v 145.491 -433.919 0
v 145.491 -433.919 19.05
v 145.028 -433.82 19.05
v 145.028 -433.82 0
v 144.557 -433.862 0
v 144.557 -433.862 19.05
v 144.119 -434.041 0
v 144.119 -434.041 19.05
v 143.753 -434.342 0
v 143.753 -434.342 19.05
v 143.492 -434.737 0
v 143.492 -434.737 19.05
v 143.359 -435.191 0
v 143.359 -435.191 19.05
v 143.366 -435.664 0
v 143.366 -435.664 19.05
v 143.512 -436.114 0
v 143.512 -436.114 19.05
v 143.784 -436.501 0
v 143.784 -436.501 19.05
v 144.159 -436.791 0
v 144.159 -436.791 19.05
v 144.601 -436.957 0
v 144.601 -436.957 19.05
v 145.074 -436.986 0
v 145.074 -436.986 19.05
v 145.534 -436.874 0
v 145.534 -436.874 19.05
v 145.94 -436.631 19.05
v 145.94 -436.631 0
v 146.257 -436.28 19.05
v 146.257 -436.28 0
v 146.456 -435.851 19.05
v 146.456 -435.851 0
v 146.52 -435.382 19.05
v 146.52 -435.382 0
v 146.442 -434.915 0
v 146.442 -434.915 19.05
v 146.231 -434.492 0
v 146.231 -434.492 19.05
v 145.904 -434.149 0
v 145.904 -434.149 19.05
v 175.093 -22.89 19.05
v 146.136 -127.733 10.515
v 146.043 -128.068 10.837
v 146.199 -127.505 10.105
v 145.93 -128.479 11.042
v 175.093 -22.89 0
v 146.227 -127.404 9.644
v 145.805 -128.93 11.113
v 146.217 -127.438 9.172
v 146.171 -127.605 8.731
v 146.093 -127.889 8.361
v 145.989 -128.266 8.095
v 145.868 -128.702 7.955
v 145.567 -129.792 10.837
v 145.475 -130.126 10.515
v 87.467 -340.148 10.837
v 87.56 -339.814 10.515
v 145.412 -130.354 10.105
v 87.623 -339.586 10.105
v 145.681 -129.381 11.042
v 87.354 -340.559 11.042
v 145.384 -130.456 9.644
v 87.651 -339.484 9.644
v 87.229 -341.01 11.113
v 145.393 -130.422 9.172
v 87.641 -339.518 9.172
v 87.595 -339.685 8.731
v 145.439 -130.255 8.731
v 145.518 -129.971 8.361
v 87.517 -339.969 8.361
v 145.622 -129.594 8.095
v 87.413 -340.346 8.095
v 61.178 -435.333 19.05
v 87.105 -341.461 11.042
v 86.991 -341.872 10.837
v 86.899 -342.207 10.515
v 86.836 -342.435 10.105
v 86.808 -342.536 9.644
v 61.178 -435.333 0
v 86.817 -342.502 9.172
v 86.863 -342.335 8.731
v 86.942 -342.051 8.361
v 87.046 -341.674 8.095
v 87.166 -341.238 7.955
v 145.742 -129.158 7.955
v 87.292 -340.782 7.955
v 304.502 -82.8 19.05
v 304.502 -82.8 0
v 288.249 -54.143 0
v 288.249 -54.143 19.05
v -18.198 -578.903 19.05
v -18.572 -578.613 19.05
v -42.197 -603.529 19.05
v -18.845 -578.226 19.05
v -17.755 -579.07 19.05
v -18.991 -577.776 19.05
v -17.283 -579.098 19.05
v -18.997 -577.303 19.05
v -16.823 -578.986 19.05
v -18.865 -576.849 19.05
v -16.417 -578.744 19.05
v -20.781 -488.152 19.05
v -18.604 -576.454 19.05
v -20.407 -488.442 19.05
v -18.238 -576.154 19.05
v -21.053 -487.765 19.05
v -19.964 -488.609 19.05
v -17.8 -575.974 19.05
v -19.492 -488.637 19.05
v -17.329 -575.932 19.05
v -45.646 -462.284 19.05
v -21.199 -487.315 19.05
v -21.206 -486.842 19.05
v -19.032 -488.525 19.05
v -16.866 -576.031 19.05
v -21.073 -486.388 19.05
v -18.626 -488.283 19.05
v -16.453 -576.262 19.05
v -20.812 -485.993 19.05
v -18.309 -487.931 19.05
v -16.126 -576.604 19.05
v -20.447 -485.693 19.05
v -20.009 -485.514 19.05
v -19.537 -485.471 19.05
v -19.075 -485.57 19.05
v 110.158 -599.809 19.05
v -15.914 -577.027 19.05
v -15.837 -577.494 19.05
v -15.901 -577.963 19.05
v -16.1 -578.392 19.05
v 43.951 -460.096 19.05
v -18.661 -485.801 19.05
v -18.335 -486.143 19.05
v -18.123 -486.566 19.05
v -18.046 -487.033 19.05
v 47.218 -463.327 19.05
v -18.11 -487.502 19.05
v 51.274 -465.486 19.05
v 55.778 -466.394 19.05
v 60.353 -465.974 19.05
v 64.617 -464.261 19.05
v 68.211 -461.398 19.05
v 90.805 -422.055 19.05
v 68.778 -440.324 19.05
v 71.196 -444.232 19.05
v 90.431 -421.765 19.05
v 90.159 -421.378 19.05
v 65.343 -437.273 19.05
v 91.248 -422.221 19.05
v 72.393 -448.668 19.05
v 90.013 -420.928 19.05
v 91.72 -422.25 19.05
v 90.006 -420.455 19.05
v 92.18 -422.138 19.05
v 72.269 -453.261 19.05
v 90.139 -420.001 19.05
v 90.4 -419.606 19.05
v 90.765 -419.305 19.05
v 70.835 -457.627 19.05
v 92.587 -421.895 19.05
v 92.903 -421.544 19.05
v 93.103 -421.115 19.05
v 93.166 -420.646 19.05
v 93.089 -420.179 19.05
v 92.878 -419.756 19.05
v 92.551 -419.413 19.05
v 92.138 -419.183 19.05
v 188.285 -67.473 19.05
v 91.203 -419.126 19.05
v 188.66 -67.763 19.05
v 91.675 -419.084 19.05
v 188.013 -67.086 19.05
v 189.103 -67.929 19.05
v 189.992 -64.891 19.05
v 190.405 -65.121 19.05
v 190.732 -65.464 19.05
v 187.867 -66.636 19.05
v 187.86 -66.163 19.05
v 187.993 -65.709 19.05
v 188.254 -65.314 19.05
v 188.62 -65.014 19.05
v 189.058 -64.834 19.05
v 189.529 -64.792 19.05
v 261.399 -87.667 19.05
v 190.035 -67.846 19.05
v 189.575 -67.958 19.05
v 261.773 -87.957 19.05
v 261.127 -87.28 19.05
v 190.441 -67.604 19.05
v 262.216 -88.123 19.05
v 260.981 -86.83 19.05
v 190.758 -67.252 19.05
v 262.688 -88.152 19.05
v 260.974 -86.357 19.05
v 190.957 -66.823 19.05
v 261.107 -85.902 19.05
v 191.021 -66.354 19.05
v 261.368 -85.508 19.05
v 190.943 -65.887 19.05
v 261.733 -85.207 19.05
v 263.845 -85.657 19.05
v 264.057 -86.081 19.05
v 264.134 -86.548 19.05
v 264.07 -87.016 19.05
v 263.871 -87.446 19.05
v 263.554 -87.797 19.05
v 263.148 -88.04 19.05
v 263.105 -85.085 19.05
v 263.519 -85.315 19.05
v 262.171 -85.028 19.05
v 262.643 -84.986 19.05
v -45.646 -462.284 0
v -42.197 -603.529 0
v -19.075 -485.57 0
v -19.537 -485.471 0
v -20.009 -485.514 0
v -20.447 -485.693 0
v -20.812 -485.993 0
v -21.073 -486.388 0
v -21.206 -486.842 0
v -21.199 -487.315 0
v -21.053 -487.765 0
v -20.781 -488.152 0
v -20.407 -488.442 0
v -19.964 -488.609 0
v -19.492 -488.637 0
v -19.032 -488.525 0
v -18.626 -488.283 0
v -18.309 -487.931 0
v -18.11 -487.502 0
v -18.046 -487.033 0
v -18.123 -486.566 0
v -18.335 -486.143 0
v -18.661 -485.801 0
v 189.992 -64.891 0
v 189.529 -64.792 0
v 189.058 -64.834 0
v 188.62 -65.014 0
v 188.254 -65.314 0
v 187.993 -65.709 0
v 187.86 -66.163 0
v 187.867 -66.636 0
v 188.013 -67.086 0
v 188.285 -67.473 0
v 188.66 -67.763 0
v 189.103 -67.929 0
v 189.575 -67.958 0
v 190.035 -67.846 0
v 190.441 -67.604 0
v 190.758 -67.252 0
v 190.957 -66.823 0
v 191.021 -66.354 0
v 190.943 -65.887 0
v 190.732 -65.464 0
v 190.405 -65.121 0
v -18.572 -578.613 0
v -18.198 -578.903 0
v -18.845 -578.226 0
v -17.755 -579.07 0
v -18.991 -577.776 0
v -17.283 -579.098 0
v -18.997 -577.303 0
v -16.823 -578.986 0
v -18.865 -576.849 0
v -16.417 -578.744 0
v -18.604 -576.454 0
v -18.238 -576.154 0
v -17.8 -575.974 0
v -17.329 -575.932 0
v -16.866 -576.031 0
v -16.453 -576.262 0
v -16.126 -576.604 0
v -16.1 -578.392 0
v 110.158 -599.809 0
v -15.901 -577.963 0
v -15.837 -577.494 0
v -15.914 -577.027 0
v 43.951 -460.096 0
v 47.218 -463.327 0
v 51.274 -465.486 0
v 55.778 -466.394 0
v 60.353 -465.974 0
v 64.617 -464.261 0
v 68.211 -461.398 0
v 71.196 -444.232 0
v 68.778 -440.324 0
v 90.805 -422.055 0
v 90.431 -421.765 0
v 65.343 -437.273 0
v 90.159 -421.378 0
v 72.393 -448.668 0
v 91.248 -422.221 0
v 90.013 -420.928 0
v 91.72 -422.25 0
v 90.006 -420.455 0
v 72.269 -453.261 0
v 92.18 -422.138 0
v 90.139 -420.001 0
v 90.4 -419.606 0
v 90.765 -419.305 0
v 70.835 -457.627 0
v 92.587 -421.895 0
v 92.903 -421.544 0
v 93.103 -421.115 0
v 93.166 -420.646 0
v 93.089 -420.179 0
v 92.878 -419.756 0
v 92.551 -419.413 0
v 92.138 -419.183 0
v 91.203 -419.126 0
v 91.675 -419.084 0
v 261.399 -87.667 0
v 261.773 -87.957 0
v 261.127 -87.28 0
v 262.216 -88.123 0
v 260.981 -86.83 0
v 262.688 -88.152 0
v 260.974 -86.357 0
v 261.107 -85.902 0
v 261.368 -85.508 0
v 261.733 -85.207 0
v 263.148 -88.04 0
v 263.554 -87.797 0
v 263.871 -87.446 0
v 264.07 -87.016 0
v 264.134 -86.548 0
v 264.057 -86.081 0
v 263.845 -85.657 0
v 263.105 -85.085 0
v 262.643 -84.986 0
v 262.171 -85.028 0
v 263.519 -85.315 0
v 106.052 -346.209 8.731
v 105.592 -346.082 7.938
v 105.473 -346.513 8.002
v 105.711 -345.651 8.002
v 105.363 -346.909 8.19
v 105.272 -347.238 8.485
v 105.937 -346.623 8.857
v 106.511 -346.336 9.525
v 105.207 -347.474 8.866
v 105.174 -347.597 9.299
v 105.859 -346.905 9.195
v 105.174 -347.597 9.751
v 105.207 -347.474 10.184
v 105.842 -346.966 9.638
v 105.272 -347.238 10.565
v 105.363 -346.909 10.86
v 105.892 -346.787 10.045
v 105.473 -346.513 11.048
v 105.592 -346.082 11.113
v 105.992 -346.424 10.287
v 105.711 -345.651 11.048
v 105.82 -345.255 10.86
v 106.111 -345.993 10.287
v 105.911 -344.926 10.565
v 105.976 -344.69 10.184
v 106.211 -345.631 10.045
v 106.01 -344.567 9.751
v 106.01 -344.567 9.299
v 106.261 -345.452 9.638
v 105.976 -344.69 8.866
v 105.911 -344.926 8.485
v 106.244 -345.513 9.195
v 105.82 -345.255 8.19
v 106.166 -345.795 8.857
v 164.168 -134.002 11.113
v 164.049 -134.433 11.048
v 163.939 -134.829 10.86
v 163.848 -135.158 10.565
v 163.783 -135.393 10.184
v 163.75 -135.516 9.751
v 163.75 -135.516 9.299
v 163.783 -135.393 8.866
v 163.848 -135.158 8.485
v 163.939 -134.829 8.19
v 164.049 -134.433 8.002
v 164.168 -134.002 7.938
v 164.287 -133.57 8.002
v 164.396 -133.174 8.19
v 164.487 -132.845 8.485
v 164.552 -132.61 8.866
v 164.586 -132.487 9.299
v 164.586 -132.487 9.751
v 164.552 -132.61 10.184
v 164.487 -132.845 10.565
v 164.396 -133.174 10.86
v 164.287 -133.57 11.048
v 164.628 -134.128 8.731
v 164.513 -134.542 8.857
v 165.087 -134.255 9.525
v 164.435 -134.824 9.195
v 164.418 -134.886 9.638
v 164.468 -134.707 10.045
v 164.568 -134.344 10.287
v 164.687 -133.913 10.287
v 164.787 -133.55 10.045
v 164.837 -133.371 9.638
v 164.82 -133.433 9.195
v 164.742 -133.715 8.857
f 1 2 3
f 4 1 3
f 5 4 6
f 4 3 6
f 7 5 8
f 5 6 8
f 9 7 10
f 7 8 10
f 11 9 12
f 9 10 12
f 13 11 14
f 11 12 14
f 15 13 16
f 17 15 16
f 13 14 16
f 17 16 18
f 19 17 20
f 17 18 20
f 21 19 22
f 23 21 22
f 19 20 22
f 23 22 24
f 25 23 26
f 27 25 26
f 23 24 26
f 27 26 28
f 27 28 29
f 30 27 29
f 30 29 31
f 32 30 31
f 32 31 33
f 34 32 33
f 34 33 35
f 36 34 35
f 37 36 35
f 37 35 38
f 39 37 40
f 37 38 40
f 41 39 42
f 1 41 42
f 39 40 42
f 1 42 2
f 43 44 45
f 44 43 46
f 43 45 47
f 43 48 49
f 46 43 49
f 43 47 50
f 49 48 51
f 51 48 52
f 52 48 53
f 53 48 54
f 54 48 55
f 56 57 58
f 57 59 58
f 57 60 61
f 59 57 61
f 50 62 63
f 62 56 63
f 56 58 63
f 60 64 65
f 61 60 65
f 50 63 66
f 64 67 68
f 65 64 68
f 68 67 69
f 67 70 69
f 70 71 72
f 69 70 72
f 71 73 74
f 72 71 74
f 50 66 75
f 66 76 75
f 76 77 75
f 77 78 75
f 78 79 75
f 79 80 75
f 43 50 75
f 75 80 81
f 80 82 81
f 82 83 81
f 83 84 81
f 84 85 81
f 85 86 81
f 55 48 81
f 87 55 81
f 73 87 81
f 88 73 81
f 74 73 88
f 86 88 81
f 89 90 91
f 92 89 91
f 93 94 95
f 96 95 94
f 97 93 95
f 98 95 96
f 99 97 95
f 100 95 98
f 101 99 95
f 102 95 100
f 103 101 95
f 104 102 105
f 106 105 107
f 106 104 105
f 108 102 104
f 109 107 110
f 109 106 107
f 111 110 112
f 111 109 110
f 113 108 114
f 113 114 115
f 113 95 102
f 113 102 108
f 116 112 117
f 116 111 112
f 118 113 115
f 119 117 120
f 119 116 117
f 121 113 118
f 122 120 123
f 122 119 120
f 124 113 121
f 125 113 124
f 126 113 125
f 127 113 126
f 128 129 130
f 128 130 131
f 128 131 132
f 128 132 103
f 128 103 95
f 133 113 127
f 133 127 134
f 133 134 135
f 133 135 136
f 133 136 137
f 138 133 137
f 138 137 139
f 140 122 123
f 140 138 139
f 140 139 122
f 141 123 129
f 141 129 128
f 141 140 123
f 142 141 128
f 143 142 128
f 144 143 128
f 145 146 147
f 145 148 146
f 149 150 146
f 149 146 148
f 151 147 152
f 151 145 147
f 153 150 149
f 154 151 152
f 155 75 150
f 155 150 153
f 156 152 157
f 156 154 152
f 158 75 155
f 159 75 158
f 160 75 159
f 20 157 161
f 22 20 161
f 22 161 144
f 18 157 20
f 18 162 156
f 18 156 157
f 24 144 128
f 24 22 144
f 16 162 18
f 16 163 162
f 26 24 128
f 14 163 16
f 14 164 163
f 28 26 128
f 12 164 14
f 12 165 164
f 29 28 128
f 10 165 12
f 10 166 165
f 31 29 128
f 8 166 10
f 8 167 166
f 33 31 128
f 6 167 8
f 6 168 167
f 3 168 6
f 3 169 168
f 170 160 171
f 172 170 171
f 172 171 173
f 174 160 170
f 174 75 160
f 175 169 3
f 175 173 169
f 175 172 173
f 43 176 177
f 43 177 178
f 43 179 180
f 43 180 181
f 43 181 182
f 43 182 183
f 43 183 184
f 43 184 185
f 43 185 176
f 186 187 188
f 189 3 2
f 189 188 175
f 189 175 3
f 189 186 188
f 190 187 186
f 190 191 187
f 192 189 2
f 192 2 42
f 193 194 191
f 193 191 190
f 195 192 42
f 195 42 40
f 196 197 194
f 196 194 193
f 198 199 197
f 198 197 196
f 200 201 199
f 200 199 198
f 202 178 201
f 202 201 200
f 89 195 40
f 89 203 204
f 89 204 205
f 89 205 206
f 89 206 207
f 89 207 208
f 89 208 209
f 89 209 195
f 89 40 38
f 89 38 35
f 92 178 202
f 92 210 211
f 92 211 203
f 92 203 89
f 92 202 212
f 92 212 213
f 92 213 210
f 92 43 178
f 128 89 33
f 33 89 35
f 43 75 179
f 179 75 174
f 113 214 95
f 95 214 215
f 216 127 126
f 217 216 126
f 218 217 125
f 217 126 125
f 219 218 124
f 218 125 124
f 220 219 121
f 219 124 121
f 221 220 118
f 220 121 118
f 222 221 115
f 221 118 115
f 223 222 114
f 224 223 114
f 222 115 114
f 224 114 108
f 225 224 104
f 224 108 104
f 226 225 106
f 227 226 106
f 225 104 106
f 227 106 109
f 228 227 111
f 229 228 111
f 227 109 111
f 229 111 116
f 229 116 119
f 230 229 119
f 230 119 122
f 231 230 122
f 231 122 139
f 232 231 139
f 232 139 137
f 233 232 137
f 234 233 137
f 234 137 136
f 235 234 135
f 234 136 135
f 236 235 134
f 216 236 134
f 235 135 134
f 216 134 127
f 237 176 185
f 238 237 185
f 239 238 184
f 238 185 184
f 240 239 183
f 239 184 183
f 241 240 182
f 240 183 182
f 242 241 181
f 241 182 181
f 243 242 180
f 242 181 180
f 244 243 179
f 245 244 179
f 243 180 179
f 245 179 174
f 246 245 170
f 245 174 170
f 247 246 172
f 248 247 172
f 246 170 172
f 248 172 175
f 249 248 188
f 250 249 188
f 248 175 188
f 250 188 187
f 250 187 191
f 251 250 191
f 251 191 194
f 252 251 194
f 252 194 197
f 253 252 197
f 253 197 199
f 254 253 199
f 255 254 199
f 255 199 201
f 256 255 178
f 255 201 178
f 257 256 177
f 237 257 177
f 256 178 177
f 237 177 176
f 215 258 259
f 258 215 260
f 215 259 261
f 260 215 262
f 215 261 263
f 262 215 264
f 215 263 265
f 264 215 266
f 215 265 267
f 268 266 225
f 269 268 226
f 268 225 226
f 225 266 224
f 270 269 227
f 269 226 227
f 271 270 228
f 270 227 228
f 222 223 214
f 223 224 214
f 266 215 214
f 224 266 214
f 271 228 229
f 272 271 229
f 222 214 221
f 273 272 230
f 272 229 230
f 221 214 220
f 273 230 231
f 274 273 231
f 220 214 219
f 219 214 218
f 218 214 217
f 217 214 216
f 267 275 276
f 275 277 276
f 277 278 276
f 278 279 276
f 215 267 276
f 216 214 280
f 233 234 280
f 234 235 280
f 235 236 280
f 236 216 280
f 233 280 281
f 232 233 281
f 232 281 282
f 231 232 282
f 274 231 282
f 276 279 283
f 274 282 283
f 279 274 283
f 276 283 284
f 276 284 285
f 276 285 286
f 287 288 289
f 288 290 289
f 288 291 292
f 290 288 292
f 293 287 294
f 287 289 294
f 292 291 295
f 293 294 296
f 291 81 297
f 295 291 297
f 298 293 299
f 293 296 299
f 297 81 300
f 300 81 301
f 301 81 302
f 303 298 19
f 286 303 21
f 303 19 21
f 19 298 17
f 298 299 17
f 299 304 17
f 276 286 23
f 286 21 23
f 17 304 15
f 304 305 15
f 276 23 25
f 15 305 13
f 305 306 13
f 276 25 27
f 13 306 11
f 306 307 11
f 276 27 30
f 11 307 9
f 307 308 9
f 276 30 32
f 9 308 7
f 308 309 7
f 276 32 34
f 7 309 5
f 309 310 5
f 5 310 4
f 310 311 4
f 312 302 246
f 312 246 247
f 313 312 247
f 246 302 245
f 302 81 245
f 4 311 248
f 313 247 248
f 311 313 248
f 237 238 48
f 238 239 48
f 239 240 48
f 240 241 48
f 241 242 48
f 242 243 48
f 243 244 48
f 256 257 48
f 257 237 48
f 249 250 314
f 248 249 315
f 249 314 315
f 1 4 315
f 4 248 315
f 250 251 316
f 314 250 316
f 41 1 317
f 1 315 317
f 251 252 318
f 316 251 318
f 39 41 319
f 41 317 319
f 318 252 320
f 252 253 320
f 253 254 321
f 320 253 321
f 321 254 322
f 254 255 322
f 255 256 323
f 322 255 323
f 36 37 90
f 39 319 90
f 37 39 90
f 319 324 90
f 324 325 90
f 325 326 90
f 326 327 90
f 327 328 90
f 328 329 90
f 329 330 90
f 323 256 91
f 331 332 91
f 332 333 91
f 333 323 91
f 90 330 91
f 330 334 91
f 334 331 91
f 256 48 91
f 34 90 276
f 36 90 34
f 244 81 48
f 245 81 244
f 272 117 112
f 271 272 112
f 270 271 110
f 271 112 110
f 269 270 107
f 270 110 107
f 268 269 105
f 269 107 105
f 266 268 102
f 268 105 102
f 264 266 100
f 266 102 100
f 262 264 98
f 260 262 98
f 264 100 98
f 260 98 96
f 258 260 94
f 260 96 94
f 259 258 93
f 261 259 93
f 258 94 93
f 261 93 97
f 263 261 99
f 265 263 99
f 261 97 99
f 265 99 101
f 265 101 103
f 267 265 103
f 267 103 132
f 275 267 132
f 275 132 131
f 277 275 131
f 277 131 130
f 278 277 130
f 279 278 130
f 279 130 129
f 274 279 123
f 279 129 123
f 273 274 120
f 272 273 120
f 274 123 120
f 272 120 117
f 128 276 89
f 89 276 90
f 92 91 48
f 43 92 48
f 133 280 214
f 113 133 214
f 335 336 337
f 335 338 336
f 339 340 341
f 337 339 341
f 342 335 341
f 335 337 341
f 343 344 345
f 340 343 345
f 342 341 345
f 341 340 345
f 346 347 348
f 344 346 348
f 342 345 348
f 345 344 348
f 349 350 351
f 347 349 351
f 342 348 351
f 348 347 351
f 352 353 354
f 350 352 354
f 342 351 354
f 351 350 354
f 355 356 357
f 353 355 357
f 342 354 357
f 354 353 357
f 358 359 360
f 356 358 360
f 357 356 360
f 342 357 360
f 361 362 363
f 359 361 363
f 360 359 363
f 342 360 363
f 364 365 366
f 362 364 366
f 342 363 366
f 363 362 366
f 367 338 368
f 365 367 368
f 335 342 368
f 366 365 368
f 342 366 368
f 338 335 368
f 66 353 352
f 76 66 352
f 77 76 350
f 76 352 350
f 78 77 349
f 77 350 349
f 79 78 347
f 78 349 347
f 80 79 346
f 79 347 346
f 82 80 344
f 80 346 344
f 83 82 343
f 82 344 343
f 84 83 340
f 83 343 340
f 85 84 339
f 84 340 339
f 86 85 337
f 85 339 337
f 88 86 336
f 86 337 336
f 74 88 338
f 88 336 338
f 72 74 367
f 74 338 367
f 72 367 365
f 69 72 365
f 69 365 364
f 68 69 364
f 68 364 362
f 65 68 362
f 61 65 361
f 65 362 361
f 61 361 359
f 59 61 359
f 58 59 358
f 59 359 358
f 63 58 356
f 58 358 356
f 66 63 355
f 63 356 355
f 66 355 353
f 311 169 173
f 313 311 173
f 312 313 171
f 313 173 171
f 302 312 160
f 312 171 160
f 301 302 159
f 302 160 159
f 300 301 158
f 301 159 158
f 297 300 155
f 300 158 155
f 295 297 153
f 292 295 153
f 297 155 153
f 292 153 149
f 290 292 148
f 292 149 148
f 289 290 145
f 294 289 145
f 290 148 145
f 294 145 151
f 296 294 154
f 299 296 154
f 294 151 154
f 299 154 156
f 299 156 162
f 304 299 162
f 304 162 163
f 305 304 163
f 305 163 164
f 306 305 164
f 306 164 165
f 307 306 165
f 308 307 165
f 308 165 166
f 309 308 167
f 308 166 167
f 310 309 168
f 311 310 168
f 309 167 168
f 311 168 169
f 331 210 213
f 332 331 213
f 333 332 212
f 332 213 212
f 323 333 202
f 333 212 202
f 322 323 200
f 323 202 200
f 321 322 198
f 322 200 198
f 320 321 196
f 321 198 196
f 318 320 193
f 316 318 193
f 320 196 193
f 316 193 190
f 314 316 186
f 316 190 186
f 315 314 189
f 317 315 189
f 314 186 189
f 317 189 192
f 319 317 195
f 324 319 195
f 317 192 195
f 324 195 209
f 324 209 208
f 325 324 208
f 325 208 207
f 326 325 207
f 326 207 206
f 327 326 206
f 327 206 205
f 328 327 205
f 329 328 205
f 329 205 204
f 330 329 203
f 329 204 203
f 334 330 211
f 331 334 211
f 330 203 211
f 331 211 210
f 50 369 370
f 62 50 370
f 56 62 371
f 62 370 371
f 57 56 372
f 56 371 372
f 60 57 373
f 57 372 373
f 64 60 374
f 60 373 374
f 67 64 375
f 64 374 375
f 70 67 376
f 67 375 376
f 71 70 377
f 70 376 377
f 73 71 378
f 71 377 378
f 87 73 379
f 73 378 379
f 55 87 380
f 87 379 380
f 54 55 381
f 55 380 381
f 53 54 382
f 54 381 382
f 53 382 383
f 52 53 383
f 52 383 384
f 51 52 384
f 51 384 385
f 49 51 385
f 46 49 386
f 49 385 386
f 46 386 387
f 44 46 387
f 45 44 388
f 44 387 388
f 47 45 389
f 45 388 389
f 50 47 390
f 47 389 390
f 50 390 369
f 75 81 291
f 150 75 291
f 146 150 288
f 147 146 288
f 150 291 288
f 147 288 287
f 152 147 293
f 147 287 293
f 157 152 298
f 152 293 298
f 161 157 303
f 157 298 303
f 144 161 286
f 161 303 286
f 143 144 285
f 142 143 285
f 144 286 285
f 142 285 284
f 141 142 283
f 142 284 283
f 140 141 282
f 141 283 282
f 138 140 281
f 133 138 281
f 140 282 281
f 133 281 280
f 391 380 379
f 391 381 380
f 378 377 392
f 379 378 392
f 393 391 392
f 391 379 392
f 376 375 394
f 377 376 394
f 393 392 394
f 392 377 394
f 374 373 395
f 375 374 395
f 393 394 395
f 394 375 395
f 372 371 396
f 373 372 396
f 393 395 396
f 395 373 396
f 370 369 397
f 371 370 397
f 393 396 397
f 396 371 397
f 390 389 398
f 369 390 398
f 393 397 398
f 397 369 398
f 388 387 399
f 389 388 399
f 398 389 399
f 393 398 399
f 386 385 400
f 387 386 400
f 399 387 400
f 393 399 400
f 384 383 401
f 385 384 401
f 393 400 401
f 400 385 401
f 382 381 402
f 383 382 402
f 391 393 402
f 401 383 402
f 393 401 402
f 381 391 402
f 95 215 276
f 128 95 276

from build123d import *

# Parameters (mm, degrees)
BOSS_EXTRUDE1_DEPTH = 19.05
HOLE2_D             = 3.175
HOLE2_DEPTH         = 31.75
HOLE2_CSINK_D       = 10.16
HOLE2_CSINK_ANGLE   = 82
HOLE2_TIP           = 0.953866233
HOLE3_D             = 3.175
HOLE3_DEPTH         = 38.1
HOLE3_CSINK_D       = 10.16
HOLE3_CSINK_ANGLE   = 82
HOLE3_TIP           = 0.953866233


with BuildPart() as part:
    # Sketch1 → Boss-Extrude1 (new body)
    with BuildSketch(Plane.XY):
        with BuildLine():
            Line((-45.645654956, -462.283590669), (-42.196851456, -603.529354269))
            Line((-42.196851456, -603.529354269), (110.157739028, -599.809306096))
            Line((110.157739028, -599.809306096), (304.502022379, -82.799914861))
            Line((304.502022379, -82.799914861), (288.249001778, -54.142860136))
            Line((288.249001778, -54.142860136), (175.093421906, -22.889613201))
            Line((175.093421906, -22.889613201), (61.177817241, -435.332721236))
            ThreePointArc((61.177817241, -435.332721236), (69.660650717, -459.60790015), (43.950640658, -460.09591431))
            Line((43.950640658, -460.09591431), (-45.645654956, -462.283590669))
        make_face()
    extrude(amount=BOSS_EXTRUDE1_DEPTH)

    # Hole2
    with Locations(Plane(origin=(162.245907498, -21.702082459, 165.474999994), x_dir=(0, 0, -1), z_dir=(-0.963909776, 0.266229118, 0))):
        with Locations((-155.949999994, 107.734820482), (155.949999994, 107.734820482), (155.949999994, 327.755881328), (174.999999994, 85.732714397), (174.999999994, 349.757987412), (-174.999999994, 349.757987412), (-174.999999994, 85.732714397), (-155.949999994, 327.755881328)):
            CounterSinkHole(HOLE2_D / 2, HOLE2_CSINK_D / 2, depth=HOLE2_DEPTH, counter_sink_angle=HOLE2_CSINK_ANGLE)
            with Locations((0, 0, -(HOLE2_DEPTH + HOLE2_TIP / 2))):  # 118° drill point
                Cone(0, HOLE2_D / 2, HOLE2_TIP, mode=Mode.SUBTRACT)

    # Hole3
    with Locations(Plane(origin=(311.92831292, -63.043933951, -19.05), x_dir=(-0.351862635, -0.936051647, 0), z_dir=(0, 0, -1))):
        with Locations((46.221112845, 113.488854888), (39.39759596, 37.945520226), (412.28786892, 80.423559293), (407.308516105, 25.297013484), (513.561319184, 161.164706775), (597.46020397, 127.267357003), (610.543339245, 159.649253123), (694.322923815, 367.011001477), (526.644454459, 193.546602895), (610.424039029, 400.908351249)):
            CounterSinkHole(HOLE3_D / 2, HOLE3_CSINK_D / 2, depth=HOLE3_DEPTH, counter_sink_angle=HOLE3_CSINK_ANGLE)
            with Locations((0, 0, -(HOLE3_DEPTH + HOLE3_TIP / 2))):  # 118° drill point
                Cone(0, HOLE3_D / 2, HOLE3_TIP, mode=Mode.SUBTRACT)


solid = part.part
